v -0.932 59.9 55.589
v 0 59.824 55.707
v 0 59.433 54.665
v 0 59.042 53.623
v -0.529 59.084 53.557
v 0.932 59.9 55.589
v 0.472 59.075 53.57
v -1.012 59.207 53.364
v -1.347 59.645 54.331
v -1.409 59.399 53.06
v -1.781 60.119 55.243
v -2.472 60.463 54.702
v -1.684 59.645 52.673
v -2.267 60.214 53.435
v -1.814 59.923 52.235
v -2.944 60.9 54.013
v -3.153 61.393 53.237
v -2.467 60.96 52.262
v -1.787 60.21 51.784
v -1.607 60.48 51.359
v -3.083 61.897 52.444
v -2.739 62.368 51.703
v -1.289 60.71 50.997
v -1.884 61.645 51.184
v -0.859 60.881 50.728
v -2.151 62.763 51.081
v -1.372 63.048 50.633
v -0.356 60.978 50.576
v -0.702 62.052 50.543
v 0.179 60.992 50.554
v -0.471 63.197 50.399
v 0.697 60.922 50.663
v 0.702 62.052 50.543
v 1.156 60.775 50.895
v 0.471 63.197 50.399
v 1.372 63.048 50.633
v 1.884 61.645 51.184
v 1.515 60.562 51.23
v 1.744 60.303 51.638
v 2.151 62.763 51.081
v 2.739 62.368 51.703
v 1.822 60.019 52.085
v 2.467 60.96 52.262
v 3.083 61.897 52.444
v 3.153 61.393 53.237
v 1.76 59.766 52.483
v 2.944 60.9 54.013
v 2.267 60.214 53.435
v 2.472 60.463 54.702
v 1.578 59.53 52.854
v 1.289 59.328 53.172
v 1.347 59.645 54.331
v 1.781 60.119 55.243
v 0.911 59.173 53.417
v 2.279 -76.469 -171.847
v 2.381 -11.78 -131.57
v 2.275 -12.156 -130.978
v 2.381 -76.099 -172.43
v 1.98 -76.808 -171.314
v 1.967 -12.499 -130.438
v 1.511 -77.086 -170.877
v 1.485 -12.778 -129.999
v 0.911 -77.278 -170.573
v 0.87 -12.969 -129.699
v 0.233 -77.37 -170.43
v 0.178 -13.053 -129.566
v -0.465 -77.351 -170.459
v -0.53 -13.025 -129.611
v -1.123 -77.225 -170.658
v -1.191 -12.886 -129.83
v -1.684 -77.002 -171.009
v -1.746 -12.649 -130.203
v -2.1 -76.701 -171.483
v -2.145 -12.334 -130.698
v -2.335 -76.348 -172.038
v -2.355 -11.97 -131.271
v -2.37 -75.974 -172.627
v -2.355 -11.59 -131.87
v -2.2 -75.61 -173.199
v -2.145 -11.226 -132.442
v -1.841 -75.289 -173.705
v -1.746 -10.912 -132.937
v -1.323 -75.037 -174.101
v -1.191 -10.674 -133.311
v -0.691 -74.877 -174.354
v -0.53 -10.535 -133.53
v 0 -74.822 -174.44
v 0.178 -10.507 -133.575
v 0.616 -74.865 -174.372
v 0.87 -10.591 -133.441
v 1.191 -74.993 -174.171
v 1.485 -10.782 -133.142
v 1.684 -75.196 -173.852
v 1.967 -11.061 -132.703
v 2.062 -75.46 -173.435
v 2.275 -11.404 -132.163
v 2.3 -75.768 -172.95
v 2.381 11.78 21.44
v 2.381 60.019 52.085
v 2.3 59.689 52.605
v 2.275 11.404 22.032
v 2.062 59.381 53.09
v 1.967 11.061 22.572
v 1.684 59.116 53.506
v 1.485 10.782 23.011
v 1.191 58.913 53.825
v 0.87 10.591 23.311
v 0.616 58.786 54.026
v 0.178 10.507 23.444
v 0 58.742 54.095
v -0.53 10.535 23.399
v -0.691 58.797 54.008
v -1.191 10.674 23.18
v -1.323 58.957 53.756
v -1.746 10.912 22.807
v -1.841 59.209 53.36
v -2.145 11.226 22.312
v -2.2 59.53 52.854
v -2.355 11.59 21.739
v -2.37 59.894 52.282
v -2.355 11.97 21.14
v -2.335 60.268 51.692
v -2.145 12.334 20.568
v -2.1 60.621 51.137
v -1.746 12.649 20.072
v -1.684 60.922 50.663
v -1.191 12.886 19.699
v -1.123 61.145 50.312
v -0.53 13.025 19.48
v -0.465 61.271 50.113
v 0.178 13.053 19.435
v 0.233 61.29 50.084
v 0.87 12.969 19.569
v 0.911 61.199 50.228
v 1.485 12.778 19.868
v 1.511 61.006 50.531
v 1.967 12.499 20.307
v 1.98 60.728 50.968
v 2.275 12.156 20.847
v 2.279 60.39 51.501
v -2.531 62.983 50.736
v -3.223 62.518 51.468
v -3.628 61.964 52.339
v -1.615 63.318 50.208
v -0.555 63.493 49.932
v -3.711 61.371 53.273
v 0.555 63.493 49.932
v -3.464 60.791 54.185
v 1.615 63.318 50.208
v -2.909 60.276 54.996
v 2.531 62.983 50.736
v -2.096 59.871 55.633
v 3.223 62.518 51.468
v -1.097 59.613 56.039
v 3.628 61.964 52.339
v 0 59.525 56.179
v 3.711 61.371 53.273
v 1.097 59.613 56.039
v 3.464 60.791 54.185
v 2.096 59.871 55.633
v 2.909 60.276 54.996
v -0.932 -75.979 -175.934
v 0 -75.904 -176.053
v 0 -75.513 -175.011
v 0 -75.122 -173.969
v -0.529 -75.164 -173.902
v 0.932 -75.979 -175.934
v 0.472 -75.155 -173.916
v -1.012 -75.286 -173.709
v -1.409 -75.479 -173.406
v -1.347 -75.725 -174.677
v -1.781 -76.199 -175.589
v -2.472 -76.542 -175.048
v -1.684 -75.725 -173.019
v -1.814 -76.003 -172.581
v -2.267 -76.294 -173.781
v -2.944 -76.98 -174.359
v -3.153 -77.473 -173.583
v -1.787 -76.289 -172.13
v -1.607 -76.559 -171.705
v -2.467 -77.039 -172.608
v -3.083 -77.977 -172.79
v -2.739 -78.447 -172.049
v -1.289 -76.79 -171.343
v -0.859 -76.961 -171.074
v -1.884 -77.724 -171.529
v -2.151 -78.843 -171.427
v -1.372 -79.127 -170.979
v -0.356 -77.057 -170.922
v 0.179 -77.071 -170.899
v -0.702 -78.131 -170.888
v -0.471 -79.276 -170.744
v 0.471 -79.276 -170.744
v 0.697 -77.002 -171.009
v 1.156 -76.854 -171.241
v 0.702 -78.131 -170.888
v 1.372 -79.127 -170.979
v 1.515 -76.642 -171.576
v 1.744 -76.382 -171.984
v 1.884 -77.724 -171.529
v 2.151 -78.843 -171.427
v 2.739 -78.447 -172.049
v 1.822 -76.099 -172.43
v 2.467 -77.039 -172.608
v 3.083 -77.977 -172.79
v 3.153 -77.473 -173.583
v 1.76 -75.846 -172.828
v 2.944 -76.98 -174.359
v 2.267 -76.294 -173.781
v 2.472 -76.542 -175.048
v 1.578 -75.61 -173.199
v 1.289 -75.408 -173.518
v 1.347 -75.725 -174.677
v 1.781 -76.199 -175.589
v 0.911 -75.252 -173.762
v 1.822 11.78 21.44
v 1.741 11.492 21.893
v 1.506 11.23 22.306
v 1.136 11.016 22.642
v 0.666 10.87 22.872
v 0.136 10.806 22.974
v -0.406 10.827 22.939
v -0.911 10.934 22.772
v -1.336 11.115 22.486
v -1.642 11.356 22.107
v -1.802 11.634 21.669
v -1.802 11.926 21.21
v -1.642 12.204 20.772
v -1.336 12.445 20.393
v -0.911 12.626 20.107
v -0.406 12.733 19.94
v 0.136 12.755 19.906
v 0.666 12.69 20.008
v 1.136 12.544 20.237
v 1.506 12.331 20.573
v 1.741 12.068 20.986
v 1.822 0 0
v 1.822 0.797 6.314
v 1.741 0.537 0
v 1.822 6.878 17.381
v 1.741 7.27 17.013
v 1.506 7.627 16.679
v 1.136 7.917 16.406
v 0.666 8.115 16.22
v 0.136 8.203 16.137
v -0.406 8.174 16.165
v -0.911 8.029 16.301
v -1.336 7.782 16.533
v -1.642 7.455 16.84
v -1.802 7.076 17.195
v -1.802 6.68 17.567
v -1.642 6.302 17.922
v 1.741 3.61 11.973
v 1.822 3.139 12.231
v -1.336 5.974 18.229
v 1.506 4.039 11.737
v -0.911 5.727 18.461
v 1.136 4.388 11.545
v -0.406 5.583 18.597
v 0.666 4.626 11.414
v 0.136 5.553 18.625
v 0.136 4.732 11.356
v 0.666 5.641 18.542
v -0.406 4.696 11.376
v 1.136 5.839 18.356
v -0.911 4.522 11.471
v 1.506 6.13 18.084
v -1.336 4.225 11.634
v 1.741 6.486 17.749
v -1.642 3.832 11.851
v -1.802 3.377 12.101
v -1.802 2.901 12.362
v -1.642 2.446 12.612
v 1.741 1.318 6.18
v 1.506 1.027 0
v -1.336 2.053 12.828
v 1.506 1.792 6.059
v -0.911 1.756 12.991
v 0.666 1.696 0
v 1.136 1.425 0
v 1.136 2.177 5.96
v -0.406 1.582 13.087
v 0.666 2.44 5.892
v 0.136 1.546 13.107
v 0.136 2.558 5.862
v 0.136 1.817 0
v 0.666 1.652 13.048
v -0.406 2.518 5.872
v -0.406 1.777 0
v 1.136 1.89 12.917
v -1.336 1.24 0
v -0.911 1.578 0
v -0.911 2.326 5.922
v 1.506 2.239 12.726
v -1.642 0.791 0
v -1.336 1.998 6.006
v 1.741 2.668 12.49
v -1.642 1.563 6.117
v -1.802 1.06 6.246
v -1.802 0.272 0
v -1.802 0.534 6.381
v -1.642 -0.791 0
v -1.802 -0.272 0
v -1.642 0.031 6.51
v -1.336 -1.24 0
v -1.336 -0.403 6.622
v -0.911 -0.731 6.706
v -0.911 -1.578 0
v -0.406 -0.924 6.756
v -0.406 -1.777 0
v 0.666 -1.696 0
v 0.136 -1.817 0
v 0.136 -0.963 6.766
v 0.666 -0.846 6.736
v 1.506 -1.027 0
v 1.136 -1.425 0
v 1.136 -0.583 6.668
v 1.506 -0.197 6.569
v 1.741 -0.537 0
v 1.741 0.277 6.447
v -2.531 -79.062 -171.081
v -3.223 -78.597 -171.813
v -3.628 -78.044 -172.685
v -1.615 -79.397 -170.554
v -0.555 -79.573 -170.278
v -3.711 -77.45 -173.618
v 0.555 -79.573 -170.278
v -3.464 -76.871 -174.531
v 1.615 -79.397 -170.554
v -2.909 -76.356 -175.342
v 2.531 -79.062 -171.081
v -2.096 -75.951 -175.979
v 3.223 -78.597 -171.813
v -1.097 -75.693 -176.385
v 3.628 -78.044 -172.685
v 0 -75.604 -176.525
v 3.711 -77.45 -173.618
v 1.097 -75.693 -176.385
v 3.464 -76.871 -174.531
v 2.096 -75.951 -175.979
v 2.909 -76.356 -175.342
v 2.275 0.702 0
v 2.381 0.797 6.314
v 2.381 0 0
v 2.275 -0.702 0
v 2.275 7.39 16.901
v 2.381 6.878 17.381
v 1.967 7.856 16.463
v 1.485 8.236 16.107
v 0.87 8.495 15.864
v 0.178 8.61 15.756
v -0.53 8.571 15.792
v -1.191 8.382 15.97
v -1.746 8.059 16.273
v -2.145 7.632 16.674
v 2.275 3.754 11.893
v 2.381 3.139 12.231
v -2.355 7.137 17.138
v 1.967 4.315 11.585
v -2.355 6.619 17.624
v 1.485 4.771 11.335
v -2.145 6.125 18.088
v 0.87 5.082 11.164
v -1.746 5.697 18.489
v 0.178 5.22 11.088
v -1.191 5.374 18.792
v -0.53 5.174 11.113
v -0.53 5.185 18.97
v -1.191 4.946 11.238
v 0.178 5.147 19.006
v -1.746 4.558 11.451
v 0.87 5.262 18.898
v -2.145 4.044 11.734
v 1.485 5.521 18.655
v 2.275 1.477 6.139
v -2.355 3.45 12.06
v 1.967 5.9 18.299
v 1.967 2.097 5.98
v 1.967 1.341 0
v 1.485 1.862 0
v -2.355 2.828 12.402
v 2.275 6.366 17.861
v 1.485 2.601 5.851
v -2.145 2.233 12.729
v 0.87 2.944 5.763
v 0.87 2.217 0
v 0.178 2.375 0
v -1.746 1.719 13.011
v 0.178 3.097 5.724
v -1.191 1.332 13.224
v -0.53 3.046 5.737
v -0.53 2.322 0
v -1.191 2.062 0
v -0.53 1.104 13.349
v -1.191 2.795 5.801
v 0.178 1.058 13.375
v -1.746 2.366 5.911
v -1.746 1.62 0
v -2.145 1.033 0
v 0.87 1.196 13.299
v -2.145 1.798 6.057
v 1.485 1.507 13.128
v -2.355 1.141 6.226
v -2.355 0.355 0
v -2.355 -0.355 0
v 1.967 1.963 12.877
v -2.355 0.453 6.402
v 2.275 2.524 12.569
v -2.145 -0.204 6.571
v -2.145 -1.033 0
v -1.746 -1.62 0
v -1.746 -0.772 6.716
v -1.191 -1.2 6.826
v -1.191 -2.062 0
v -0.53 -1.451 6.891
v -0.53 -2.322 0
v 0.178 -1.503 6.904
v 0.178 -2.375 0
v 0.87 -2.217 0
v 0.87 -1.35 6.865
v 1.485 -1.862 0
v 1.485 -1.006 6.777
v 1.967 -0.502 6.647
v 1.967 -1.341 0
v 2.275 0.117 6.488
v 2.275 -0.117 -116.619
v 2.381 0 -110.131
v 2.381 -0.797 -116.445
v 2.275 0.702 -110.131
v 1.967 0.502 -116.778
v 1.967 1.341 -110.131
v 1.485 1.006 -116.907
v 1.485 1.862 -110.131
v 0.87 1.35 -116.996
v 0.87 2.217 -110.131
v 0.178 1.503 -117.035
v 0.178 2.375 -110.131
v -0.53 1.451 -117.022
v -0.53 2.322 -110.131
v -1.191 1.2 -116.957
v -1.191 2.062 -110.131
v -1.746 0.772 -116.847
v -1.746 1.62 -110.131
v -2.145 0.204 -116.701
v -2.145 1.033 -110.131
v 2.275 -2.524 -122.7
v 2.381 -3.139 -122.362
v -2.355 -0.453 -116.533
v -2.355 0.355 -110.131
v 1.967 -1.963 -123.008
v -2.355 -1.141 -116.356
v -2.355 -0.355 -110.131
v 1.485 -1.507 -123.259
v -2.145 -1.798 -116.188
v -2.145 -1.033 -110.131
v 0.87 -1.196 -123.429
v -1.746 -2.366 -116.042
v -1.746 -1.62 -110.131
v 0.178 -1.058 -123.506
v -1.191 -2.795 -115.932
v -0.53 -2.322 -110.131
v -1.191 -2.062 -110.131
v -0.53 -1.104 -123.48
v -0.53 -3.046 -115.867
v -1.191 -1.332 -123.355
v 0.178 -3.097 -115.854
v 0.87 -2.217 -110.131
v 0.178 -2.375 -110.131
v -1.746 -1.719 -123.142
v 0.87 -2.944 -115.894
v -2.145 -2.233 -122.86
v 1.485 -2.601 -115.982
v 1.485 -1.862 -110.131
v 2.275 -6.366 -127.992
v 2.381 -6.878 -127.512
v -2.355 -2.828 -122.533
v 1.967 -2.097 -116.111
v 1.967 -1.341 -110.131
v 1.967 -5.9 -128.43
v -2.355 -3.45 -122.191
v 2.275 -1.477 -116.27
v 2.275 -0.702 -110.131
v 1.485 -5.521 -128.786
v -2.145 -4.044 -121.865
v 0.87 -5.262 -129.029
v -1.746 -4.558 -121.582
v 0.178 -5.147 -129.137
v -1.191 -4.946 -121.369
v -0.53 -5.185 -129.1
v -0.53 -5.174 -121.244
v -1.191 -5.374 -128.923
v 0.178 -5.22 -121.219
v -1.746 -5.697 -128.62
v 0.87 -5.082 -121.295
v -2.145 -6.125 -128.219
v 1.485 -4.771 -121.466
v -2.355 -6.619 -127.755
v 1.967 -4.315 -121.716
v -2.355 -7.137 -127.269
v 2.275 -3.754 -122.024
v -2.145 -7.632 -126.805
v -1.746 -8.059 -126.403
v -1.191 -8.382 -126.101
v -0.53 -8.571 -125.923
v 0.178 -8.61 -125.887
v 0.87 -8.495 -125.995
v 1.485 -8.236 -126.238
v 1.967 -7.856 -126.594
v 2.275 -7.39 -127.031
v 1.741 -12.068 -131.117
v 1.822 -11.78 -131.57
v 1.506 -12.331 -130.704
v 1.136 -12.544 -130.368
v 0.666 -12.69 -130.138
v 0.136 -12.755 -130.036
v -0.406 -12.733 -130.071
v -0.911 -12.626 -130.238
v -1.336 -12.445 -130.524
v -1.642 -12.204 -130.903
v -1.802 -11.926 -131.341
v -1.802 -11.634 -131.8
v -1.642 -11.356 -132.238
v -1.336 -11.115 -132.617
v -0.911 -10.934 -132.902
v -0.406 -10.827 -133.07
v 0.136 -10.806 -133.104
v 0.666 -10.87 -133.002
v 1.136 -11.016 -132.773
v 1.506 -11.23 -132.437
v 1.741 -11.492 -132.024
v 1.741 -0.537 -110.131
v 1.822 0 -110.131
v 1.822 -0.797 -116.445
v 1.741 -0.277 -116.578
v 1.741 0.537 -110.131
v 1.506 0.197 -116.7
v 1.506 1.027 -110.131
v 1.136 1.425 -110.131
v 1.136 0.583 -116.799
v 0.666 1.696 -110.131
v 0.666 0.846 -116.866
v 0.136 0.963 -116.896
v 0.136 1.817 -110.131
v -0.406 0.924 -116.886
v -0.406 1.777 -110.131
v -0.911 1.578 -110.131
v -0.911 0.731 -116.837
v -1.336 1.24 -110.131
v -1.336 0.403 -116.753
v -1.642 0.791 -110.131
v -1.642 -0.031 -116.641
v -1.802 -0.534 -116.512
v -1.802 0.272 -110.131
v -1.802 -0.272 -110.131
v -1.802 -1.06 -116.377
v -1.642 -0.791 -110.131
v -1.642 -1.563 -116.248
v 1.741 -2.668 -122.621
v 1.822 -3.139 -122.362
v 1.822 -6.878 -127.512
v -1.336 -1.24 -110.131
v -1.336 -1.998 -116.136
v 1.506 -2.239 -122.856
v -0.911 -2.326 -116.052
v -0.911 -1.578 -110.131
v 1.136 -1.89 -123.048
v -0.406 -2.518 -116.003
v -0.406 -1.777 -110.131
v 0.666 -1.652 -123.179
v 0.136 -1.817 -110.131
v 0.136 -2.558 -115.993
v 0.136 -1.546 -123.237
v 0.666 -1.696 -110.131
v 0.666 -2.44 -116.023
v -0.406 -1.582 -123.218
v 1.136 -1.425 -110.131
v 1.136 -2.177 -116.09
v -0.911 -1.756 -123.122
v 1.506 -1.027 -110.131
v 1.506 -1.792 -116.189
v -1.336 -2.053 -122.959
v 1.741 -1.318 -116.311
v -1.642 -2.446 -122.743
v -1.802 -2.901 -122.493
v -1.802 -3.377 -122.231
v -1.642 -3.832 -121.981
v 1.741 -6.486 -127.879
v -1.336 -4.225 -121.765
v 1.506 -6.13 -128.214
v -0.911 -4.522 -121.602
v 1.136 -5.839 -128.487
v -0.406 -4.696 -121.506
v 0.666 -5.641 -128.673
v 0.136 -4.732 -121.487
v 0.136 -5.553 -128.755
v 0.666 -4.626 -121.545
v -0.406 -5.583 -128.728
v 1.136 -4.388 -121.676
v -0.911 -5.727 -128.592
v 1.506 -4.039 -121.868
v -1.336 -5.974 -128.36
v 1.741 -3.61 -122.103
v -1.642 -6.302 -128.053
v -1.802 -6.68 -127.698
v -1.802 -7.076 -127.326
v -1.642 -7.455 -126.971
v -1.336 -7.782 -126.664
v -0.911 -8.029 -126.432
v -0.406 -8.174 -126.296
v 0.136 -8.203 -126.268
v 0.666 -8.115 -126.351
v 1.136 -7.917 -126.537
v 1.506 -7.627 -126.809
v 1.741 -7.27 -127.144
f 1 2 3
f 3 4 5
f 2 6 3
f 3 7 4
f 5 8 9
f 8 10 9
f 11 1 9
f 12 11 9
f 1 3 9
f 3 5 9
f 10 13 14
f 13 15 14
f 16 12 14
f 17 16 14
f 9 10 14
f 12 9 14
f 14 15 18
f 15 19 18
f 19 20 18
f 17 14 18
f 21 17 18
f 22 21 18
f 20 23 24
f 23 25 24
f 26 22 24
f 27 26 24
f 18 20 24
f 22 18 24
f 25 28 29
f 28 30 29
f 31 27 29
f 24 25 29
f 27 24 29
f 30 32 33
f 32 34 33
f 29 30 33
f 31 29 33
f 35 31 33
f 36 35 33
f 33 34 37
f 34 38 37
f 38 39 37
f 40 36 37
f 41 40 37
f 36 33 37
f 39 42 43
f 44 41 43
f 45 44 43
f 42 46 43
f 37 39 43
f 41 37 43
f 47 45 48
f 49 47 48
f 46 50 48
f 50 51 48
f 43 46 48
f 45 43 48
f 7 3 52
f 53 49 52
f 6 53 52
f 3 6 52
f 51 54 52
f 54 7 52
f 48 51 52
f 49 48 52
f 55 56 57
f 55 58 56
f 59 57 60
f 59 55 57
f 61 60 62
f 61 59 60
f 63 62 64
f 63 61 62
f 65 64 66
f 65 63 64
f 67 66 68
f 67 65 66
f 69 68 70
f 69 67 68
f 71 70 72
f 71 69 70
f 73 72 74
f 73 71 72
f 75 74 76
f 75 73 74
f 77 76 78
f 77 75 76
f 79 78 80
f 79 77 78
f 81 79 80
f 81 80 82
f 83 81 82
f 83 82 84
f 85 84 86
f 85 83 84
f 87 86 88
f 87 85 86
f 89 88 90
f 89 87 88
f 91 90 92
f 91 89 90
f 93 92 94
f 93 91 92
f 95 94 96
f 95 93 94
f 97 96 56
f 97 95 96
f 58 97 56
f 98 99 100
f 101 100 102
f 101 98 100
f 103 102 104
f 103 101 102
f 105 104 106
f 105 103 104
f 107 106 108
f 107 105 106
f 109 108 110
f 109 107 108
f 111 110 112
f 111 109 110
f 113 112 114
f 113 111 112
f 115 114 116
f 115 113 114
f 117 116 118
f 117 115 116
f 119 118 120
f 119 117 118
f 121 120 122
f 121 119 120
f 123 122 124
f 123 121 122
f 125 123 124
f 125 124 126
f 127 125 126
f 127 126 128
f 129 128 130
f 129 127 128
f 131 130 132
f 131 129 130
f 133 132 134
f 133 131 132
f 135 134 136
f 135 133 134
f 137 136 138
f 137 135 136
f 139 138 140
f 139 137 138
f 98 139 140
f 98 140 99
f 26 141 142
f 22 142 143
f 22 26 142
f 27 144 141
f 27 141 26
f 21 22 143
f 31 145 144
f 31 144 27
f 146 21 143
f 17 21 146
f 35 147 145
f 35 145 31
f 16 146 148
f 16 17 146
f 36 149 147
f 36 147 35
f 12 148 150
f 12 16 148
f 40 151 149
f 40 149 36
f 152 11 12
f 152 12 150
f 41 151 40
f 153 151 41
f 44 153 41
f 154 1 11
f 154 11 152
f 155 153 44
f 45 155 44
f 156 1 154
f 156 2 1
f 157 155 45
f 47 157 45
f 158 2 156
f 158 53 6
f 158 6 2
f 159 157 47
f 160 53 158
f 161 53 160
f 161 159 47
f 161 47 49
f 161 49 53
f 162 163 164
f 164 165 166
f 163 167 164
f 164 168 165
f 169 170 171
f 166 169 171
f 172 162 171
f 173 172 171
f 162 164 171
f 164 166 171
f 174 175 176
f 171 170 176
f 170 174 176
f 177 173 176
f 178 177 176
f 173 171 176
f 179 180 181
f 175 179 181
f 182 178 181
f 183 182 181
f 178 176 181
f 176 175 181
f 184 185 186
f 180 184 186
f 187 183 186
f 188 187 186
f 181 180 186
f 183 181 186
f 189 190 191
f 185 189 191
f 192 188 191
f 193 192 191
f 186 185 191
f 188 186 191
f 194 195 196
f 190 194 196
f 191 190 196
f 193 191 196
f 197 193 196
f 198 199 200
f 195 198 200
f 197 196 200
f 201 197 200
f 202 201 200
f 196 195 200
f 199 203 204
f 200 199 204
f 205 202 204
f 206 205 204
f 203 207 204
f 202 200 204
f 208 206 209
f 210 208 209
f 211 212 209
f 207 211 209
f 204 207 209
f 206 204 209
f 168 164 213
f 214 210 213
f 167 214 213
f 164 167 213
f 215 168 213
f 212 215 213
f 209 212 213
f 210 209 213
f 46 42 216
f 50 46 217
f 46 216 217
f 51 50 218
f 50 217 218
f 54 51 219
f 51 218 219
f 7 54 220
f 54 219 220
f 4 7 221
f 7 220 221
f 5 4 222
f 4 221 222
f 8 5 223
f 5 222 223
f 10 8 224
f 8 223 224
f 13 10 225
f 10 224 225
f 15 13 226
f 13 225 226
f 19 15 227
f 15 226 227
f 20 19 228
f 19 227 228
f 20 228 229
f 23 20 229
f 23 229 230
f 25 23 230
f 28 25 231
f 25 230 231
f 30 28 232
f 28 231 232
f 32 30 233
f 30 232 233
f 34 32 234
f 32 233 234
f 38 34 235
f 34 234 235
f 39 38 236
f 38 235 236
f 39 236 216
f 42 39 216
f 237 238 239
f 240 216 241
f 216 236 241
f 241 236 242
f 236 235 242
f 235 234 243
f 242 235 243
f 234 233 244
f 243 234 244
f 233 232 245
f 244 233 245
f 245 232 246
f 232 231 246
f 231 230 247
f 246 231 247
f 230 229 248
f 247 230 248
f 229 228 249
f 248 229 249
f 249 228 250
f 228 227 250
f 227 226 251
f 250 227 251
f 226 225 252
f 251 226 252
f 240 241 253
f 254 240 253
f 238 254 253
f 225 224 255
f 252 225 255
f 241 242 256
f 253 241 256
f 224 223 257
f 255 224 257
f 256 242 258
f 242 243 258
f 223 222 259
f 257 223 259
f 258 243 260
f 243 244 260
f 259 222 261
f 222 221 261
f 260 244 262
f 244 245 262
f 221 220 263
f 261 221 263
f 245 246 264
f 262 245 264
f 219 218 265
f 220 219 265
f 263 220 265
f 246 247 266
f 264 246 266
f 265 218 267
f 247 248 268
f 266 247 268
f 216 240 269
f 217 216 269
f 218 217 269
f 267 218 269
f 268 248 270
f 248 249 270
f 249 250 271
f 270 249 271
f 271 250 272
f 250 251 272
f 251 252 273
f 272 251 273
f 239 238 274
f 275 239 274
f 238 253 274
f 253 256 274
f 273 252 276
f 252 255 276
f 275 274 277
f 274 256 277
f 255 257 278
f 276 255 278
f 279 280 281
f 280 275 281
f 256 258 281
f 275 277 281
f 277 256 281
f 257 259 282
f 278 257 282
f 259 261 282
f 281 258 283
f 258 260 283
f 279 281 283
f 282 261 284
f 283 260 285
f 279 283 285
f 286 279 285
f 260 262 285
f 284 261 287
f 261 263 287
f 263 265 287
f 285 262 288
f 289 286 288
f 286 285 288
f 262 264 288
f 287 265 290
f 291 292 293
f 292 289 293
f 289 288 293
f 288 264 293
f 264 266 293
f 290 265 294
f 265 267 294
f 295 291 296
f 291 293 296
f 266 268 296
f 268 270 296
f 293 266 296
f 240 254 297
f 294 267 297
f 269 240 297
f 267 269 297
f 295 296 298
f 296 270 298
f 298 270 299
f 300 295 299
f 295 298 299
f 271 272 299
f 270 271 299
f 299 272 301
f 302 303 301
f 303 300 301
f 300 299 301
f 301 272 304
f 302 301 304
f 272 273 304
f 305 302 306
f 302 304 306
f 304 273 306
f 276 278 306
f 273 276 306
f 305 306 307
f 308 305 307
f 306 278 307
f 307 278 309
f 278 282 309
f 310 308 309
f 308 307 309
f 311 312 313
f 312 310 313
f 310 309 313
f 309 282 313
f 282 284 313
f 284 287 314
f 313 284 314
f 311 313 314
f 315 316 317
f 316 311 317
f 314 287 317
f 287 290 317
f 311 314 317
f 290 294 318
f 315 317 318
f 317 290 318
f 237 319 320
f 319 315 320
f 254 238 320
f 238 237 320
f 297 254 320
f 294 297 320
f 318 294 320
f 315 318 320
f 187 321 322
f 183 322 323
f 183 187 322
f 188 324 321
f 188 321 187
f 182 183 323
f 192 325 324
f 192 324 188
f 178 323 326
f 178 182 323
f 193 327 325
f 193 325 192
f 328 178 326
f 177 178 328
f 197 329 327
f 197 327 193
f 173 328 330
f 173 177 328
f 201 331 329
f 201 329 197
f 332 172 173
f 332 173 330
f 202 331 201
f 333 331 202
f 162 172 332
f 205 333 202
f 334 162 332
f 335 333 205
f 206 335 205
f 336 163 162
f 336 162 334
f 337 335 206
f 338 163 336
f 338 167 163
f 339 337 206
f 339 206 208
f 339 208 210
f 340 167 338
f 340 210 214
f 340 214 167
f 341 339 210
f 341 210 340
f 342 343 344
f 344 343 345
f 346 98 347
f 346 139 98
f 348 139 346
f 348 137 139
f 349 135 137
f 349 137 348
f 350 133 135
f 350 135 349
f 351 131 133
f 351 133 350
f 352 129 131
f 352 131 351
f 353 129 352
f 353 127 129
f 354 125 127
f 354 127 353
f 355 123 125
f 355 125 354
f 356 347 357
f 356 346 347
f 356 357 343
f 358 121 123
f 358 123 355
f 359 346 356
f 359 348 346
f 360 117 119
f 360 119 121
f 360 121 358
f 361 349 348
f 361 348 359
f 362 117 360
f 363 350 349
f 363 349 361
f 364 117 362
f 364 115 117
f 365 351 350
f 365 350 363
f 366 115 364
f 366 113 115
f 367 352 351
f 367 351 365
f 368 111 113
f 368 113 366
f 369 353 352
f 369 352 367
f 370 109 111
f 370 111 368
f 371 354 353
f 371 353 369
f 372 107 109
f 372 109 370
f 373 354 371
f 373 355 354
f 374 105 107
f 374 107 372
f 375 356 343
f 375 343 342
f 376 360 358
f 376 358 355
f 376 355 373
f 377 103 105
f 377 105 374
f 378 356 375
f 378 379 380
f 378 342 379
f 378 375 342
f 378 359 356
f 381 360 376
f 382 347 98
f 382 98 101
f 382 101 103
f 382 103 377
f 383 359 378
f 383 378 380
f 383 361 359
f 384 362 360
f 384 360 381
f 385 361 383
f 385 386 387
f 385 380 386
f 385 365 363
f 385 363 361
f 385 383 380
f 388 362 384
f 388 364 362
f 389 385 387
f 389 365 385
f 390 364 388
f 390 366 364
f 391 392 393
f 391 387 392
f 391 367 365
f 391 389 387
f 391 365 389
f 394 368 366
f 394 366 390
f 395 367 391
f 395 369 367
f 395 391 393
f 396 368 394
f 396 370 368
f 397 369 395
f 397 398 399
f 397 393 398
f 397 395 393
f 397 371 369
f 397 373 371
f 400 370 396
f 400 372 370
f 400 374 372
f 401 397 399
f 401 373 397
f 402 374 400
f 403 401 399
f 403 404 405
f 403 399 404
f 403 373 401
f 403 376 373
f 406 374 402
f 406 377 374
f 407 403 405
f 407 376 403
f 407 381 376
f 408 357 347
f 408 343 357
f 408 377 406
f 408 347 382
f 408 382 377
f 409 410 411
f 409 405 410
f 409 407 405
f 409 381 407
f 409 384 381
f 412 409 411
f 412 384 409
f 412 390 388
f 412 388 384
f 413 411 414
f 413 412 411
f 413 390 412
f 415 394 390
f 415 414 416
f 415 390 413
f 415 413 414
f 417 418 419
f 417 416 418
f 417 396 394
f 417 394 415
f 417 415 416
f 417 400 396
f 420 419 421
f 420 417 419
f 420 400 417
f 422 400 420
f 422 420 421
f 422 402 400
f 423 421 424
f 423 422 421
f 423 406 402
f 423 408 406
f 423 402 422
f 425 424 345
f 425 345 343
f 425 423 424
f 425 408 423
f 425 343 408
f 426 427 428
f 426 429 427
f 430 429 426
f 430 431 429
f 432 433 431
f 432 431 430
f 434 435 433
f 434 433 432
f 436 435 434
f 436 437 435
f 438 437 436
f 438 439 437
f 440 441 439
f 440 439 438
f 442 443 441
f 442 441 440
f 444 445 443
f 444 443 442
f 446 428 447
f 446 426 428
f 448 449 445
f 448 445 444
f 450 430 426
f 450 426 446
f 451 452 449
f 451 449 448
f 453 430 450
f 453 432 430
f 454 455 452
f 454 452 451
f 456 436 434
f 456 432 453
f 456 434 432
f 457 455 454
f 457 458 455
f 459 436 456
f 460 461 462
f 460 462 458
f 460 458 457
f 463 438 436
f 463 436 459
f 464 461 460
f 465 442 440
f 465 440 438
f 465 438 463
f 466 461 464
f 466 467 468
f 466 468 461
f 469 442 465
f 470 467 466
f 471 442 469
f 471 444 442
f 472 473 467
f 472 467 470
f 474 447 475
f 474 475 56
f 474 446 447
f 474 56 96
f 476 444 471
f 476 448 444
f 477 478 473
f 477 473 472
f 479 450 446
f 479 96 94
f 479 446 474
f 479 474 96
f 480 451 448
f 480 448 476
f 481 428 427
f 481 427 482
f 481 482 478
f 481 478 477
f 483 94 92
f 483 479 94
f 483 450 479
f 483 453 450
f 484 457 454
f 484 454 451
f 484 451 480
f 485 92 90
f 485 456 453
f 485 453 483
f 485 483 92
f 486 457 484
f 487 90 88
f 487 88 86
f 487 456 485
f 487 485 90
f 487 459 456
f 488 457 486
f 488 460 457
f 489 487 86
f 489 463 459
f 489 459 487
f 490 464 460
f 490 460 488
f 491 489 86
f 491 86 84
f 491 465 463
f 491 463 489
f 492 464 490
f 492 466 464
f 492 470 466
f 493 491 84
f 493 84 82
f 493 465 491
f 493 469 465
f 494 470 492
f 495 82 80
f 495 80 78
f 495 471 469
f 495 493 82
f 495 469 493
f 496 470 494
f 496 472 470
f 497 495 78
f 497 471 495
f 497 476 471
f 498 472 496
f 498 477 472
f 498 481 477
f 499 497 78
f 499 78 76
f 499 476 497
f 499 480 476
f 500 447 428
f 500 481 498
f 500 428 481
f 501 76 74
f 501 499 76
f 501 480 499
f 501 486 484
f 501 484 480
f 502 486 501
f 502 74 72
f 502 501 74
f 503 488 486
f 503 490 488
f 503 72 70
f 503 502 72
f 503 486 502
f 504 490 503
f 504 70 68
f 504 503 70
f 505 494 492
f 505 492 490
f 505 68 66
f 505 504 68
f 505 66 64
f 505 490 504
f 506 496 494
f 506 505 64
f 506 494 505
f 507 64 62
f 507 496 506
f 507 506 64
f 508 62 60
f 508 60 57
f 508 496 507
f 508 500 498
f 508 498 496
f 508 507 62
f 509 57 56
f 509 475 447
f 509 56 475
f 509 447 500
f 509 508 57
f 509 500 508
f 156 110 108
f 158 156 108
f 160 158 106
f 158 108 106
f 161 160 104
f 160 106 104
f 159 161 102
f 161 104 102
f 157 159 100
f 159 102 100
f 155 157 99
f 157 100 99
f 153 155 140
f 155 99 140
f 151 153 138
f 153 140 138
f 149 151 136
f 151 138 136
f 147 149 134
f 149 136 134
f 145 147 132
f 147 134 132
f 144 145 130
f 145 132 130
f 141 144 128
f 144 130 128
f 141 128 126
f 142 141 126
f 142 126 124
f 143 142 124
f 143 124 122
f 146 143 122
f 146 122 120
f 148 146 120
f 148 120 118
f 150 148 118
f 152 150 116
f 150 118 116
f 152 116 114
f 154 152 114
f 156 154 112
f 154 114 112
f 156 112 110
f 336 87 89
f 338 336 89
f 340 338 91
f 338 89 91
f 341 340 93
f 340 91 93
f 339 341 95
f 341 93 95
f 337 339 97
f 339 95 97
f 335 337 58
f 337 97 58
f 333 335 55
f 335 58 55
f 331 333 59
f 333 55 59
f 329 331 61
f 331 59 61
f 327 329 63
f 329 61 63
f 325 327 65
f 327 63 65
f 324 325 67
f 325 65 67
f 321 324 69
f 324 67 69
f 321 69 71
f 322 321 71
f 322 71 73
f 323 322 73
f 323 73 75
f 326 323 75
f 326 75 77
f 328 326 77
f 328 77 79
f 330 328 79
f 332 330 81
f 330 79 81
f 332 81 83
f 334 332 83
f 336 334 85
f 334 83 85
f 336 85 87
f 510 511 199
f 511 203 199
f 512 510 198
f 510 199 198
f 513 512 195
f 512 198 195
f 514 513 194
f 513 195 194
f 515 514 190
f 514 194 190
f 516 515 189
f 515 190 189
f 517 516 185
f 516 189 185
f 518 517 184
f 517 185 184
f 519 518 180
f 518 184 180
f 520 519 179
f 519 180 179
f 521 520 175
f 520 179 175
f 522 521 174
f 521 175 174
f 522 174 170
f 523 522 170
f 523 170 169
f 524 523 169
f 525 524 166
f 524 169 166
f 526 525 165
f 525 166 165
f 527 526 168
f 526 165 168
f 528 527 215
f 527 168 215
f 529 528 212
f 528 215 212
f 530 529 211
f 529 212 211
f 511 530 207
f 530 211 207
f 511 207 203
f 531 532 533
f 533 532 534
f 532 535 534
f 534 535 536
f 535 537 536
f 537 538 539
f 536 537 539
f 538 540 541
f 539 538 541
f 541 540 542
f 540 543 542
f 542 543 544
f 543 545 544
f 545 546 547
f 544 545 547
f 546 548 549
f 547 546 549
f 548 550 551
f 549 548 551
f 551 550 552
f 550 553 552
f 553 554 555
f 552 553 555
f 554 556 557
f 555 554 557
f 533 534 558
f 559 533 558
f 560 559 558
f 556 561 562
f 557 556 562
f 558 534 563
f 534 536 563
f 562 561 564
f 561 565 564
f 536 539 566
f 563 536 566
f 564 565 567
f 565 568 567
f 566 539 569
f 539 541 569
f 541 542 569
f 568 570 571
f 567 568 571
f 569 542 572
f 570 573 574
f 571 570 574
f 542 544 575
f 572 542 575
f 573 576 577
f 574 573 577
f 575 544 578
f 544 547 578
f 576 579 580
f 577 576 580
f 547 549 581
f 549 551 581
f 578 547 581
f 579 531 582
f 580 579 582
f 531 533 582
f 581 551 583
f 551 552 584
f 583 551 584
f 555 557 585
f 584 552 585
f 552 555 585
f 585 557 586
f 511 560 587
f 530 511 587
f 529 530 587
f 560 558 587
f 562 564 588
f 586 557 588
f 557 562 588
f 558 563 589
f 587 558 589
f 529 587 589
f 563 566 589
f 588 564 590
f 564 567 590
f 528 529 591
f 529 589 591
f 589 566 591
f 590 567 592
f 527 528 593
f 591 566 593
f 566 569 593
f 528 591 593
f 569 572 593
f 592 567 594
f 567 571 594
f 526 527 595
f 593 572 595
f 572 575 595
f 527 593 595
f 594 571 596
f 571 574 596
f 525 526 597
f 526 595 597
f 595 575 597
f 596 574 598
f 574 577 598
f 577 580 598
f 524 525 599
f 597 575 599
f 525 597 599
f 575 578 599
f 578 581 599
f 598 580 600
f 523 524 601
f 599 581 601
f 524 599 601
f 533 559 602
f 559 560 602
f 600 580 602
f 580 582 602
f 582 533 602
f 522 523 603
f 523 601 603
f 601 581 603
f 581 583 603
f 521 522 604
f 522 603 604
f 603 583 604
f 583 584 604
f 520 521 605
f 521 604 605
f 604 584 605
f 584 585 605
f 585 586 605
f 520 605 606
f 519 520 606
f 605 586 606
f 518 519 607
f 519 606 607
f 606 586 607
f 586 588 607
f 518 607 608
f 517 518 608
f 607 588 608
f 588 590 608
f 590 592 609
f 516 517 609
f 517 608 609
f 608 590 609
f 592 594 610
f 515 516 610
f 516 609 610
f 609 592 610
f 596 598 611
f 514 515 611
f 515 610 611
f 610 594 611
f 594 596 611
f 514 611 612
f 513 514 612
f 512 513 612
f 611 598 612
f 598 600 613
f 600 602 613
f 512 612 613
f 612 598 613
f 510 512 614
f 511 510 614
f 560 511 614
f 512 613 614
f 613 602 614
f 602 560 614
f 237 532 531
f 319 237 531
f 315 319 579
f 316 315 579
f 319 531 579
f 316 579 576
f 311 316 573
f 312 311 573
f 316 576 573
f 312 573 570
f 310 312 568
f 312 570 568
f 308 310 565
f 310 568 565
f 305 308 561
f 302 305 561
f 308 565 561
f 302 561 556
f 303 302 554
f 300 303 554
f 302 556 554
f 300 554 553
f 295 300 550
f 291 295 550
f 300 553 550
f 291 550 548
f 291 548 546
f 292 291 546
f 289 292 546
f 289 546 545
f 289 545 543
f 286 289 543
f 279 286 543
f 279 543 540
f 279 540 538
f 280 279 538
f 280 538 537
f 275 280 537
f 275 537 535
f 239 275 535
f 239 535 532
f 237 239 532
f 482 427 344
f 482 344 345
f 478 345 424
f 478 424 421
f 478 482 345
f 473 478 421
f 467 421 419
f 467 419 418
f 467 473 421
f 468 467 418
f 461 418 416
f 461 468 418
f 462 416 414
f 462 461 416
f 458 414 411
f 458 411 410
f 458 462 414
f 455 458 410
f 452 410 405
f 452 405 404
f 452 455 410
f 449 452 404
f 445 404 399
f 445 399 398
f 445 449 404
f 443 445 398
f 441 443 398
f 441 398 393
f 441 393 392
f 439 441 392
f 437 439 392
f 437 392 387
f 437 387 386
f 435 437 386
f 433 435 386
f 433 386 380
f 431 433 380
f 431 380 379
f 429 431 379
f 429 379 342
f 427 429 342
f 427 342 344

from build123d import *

# Parameters (mm, degrees)
SKETCH1_R           = 2.38125
SKETCH1_R_2         = 1.82245
SKETCH4_R           = 2.38125
SKETCH4_R_2         = 1.82245
SKETCH5_R           = 2.38125
BOSS_EXTRUDE1_DEPTH = 1.778
BOSS_EXTRUDE1_DRAFT = -37
SKETCH6_R           = 1.82245
CUT_EXTRUDE1_DEPTH  = 6.146397849
CUT_EXTRUDE1_DRAFT  = 37
SKETCH7_R           = 2.38125
BOSS_EXTRUDE2_DEPTH = 1.778
BOSS_EXTRUDE2_DRAFT = -37
SKETCH8_R           = 1.82245
CUT_EXTRUDE2_DEPTH  = 6.146397849
CUT_EXTRUDE2_DRAFT  = 37


with BuildPart() as part:
    # Sweep2: sweep along a path in Sketch2
    with BuildLine(Plane(origin=(0, 0, 0), x_dir=(0, 0, -1), z_dir=(1, 0, 0))) as sweep2_path:
        Line((0, 0), (110.130707173, 0))
        ThreePointArc((110.130707173, 0), (122.362068558, -3.138962318), (131.570297464, -11.780015853))
        Line((131.570297464, -11.780015853), (172.430249905, -76.098786725))
    # Sketch1 → Sweep2 (sweep)
    with BuildSketch(Plane.XY):
        Circle(SKETCH1_R)
        Circle(SKETCH1_R_2, mode=Mode.SUBTRACT)
    sweep(path=sweep2_path.line)

    # Sweep3: sweep along a path in Sketch3
    with BuildLine(Plane(origin=(0, 0, 0), x_dir=(0, 0, -1), z_dir=(1, 0, 0))) as sweep3_path:
        Line((-52.084554622, 60.019094007), (-21.439590291, 11.780015853))
        ThreePointArc((-21.439590291, 11.780015853), (-12.231361385, 3.138962318), (0, 0))
    # Sketch4 → Sweep3 (sweep)
    with BuildSketch(Plane.XY):
        Circle(SKETCH4_R)
        Circle(SKETCH4_R_2, mode=Mode.SUBTRACT)
    sweep(path=sweep3_path.line)


with BuildPart() as boss_extrude1_tool:
    # Sketch5 → Boss-Extrude1 (with draft: the straight prism first)
    with BuildSketch(Plane(origin=(0, 66.335772321, 42.141298184), x_dir=(1, 0, 0), z_dir=(0, 0.844078358, 0.536219848))):
        with Locations(Location((0, -11.780015853, 0), (0, 0, 270))):  # turned: the seam where the file's is
            Circle(SKETCH5_R)
    extrude(amount=BOSS_EXTRUDE1_DEPTH)
    # Boss-Extrude1: the draft: its side faces are tilted about the plane it starts from
    boss_extrude1_sides = [boss_extrude1_tool.faces().sort_by_distance(p)[0] for p in [
        (0, 62.046353181, 50.551292477),
    ]]
    draft(boss_extrude1_sides, Plane(origin=(0, 66.335772321, 42.141298184), x_dir=(1, 0, 0), z_dir=(0, 0.844078358, 0.536219848)), BOSS_EXTRUDE1_DRAFT)


with BuildPart() as part_1:
    add(part.part)

    # Boss-Extrude1: add boss_extrude1_tool
    add(boss_extrude1_tool.part)


with BuildPart() as cut_extrude1_tool:
    # Sketch6 → Cut-Extrude1 (with draft: the straight prism first)
    with BuildSketch(Plane(origin=(0, 66.335772321, 42.141298184), x_dir=(1, 0, 0), z_dir=(0, -0.844078358, -0.536219848))):
        with Locations(Location((0, 11.780015853, 0), (0, 0, 90))):  # turned: the seam where the file's is
            Circle(SKETCH6_R)
    extrude(amount=-CUT_EXTRUDE1_DEPTH)
    # Cut-Extrude1: the draft: its side faces are tilted about the plane it starts from
    cut_extrude1_sides = [cut_extrude1_tool.faces().sort_by_distance(p)[0] for p in [
        (0, 63.590348571, 52.194174279),
    ]]
    draft(cut_extrude1_sides, Plane(origin=(0, 66.335772321, 42.141298184), x_dir=(1, 0, 0), z_dir=(0, -0.844078358, -0.536219848)), CUT_EXTRUDE1_DRAFT)


with BuildPart() as part_2:
    add(part_1.part)

    # Cut-Extrude1: cut by cut_extrude1_tool
    add(cut_extrude1_tool.part, mode=Mode.SUBTRACT)


with BuildPart() as boss_extrude2_tool:
    # Sketch7 → Boss-Extrude2 (with draft: the straight prism first)
    with BuildSketch(Plane(origin=(0, -132.261897211, -84.022358583), x_dir=(1, 0, 0), z_dir=(0, -0.844078358, -0.536219848))):
        with Locations(Location((0, -104.738962318, 0), (0, 0, 270))):  # turned: the seam where the file's is
            Circle(SKETCH7_R)
    extrude(amount=BOSS_EXTRUDE2_DEPTH)
    # Boss-Extrude2: the draft: its side faces are tilted about the plane it starts from
    boss_extrude2_sides = [boss_extrude2_tool.faces().sort_by_distance(p)[0] for p in [
        (0, -78.126045899, -170.89698776),
    ]]
    draft(boss_extrude2_sides, Plane(origin=(0, -132.261897211, -84.022358583), x_dir=(1, 0, 0), z_dir=(0, -0.844078358, -0.536219848)), BOSS_EXTRUDE2_DRAFT)


with BuildPart() as part_3:
    add(part_2.part)

    # Boss-Extrude2: add boss_extrude2_tool
    add(boss_extrude2_tool.part)


with BuildPart() as cut_extrude2_tool:
    # Sketch8 → Cut-Extrude2 (with draft: the straight prism first)
    with BuildSketch(Plane(origin=(0, -132.261897211, -84.022358583), x_dir=(1, 0, 0), z_dir=(0, 0.844078358, 0.536219848))):
        with Locations(Location((0, 104.738962318, 0), (0, 0, 90))):  # turned: the seam where the file's is
            Circle(SKETCH8_R)
    extrude(amount=-CUT_EXTRUDE2_DEPTH)
    # Cut-Extrude2: the draft: its side faces are tilted about the plane it starts from
    cut_extrude2_sides = [cut_extrude2_tool.faces().sort_by_distance(p)[0] for p in [
        (0, -79.670041289, -172.539869562),
    ]]
    draft(cut_extrude2_sides, Plane(origin=(0, -132.261897211, -84.022358583), x_dir=(1, 0, 0), z_dir=(0, 0.844078358, 0.536219848)), CUT_EXTRUDE2_DRAFT)


with BuildPart() as part_4:
    add(part_3.part)

    # Cut-Extrude2: cut by cut_extrude2_tool
    add(cut_extrude2_tool.part, mode=Mode.SUBTRACT)


solid = part_4.part
